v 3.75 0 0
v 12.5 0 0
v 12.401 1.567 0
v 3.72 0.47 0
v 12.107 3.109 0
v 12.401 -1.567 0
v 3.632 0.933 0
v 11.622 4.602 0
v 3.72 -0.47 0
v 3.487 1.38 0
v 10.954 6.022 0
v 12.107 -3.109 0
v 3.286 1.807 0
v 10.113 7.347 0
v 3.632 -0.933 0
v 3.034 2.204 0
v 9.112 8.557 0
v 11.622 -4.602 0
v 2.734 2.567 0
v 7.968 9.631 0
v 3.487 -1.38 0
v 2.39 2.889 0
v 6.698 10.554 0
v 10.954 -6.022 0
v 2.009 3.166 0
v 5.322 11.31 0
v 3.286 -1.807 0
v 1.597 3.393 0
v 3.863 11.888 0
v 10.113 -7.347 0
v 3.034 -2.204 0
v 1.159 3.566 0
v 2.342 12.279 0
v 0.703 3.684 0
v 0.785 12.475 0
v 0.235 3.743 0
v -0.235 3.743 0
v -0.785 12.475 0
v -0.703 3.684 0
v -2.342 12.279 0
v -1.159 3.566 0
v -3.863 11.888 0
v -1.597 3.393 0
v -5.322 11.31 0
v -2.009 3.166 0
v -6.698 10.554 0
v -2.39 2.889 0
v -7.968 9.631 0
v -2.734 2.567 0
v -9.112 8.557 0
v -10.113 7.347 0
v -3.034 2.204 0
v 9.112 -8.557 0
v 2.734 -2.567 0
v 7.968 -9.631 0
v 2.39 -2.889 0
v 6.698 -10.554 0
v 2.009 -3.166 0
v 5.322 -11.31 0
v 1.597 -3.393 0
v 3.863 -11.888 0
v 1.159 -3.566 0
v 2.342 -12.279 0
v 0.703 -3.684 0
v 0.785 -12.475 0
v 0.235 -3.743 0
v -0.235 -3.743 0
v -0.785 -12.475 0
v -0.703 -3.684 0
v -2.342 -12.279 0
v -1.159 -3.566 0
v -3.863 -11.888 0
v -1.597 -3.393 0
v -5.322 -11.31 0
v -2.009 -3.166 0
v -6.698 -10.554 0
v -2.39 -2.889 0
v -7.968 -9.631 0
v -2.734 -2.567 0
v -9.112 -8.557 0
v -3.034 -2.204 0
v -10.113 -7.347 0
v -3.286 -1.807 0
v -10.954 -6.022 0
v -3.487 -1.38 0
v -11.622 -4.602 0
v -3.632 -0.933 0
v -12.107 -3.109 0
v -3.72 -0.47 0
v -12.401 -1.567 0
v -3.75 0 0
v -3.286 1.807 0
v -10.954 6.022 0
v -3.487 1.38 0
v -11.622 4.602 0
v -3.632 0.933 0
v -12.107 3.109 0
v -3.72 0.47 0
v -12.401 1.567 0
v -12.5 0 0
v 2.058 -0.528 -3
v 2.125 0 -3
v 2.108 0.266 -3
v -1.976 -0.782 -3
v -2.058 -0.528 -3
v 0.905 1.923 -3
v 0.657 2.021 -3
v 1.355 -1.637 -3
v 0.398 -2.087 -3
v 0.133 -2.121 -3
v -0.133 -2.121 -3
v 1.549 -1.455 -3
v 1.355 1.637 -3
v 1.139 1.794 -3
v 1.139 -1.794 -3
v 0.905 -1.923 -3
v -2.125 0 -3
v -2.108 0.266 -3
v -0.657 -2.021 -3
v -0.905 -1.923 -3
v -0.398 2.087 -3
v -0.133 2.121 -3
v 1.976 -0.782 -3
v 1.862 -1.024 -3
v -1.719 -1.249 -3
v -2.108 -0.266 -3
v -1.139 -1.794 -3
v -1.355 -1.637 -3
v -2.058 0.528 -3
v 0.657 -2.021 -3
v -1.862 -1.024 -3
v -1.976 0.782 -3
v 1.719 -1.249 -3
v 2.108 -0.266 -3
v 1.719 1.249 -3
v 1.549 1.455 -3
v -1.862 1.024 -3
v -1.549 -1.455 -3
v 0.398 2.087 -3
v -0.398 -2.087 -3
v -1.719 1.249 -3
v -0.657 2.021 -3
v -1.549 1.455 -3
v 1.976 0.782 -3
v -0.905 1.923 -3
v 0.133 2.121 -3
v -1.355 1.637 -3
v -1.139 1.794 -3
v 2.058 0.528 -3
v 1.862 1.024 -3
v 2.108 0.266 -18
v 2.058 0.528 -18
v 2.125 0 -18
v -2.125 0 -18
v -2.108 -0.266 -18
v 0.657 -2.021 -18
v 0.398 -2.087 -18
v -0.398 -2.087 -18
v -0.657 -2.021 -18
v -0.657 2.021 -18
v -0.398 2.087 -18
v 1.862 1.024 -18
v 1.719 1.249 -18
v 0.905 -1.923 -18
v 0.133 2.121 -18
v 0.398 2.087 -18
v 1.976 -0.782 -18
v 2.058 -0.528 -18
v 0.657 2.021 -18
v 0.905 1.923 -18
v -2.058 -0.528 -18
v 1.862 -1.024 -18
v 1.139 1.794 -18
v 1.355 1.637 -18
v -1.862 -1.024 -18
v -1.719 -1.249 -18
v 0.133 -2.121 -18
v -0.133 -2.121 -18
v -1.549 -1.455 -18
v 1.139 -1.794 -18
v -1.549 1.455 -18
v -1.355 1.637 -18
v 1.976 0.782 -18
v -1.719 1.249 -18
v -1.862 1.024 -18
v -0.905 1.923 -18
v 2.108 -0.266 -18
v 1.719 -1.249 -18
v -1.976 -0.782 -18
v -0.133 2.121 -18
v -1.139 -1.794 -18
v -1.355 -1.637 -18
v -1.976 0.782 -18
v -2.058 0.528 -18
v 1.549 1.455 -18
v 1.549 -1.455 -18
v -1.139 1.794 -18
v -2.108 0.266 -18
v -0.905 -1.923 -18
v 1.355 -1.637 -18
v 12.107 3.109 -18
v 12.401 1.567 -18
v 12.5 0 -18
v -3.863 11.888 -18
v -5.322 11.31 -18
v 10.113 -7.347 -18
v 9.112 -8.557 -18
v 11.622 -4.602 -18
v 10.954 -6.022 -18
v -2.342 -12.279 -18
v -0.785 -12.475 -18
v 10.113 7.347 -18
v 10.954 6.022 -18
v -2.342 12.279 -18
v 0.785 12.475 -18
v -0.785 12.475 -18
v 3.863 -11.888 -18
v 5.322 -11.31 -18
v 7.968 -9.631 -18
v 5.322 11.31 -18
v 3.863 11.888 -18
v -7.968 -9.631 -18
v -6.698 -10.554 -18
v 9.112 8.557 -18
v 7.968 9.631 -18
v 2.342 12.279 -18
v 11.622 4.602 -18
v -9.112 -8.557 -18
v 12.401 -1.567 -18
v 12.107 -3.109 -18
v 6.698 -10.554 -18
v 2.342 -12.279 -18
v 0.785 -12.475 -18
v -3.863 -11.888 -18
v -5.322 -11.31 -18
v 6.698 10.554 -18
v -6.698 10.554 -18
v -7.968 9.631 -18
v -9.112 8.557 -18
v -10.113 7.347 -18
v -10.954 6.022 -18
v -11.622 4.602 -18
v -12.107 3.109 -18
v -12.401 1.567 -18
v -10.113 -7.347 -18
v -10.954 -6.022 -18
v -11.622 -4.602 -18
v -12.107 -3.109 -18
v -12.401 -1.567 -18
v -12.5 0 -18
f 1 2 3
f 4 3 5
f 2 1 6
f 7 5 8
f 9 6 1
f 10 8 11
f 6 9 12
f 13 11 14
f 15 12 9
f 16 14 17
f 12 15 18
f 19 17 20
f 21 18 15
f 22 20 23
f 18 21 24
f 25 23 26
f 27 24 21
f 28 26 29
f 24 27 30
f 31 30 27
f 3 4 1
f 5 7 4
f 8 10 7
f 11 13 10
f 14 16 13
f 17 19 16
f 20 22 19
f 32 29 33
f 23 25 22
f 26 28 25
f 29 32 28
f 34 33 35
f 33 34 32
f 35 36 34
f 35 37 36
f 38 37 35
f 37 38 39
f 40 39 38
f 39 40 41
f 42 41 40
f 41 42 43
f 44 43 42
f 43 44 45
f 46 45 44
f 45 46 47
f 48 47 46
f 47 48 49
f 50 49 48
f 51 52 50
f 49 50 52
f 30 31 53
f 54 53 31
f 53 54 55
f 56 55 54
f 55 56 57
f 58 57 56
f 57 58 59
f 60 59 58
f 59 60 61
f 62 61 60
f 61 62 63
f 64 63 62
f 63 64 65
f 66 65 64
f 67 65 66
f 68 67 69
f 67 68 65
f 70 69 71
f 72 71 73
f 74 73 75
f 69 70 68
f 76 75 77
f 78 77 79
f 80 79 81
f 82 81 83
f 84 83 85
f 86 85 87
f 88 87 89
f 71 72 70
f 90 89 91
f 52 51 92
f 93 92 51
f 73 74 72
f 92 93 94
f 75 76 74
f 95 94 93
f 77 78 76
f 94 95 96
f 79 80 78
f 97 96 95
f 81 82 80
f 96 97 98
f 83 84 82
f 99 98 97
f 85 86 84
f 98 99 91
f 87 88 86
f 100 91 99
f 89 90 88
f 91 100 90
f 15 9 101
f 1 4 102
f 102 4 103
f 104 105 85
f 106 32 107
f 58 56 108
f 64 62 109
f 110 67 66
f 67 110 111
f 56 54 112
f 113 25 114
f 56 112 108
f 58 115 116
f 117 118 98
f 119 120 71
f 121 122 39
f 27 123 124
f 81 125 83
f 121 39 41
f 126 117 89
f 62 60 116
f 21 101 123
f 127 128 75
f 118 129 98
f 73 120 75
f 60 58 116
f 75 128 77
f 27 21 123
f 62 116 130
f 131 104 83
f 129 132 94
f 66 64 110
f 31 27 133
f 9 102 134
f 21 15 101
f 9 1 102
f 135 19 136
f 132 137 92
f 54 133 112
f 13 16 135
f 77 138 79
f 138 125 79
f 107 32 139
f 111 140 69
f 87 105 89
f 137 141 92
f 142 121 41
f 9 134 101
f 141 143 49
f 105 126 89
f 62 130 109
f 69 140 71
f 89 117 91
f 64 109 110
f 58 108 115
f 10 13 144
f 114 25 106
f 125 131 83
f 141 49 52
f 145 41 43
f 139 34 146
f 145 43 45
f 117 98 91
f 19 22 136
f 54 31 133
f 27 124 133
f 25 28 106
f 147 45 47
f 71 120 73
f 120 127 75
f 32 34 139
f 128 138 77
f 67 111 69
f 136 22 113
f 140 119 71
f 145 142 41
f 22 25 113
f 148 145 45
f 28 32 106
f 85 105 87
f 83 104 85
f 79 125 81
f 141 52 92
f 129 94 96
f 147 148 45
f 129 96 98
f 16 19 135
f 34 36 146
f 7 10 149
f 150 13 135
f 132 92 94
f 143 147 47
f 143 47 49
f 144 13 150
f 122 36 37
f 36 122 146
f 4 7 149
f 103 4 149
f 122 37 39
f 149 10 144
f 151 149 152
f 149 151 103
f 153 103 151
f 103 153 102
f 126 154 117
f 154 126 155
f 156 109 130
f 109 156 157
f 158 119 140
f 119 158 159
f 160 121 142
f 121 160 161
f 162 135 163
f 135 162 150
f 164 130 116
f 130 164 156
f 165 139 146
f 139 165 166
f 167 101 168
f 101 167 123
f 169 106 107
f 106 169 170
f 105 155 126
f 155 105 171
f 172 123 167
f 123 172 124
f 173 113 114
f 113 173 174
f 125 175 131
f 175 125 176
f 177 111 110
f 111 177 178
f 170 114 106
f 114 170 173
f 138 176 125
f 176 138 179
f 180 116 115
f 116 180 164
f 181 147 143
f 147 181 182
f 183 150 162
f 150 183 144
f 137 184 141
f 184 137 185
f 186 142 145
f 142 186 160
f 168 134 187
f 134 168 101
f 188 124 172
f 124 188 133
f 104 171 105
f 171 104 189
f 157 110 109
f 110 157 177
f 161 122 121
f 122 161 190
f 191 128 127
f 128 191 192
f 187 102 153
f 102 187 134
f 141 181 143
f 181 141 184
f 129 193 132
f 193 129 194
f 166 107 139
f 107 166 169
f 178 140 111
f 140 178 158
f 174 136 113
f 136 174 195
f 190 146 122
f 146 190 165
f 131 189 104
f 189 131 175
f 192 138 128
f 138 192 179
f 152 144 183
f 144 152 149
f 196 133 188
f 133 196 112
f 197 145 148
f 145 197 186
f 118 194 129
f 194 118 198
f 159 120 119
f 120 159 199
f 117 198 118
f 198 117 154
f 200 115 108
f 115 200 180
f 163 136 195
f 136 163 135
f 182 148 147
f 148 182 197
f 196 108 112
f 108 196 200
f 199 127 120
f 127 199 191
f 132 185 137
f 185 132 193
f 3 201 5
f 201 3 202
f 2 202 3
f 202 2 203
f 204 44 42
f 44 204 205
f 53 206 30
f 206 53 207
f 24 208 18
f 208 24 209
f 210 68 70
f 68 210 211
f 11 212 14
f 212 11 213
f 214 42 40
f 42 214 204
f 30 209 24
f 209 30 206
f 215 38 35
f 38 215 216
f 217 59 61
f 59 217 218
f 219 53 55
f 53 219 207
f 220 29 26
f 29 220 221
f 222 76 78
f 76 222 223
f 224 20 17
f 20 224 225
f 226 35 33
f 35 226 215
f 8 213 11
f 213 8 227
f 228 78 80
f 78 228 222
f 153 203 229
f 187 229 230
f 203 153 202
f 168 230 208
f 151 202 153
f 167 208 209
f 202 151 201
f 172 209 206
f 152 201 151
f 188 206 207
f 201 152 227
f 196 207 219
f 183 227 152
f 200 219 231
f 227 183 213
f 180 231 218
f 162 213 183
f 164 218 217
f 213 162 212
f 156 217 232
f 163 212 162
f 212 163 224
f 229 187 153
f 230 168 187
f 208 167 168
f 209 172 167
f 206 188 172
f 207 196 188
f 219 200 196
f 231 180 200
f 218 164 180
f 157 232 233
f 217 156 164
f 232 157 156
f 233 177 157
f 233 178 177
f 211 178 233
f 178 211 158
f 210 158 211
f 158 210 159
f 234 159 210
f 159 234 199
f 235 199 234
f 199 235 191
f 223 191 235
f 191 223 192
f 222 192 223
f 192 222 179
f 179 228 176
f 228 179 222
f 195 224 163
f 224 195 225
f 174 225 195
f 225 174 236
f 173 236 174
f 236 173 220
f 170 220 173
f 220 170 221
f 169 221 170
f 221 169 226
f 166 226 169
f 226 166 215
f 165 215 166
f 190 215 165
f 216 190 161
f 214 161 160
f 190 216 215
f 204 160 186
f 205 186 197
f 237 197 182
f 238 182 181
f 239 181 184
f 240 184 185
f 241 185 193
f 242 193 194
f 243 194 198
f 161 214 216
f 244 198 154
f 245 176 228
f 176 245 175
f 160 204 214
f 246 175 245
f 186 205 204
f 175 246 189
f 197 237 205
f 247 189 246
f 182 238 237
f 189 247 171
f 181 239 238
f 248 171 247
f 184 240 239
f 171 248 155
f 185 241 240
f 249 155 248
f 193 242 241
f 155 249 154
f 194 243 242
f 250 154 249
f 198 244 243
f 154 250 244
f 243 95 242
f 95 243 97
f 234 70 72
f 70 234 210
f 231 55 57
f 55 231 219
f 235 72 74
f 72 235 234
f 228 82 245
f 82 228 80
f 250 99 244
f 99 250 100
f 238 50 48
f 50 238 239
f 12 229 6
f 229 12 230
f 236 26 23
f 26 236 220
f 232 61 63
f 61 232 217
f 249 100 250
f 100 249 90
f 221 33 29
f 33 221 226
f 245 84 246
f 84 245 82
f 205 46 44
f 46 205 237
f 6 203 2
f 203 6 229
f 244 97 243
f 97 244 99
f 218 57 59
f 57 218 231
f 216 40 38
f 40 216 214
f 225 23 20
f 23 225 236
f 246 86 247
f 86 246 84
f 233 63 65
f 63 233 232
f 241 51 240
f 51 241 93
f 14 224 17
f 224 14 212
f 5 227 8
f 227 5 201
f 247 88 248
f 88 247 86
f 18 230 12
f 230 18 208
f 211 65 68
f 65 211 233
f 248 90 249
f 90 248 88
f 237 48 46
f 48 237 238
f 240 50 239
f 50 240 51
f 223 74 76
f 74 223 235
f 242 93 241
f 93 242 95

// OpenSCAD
$fn = 50;

difference() {
	union() {
		translate(v = [0, 0, -18.0]) {
			cylinder(h = 18, r = 12.5);
		}
	}
	union() {
		translate(v = [0, 0, 0]) {
			rotate(a = [0, 0, 0]) {
				difference() {
					union() {
						translate(v = [0, 0, -21.0]) {
							cylinder(h = 21, r = 2.0);
						}
						translate(v = [0, 0, -3]) {
							cylinder(h = 3, r1 = 2.125, r2 = 3.75);
						}
						translate(v = [0, 0, -21.0]) {
							cylinder(h = 21, r = 2.125);
						}
						translate(v = [0, 0, -21.0]) {
							cylinder(h = 21, r = 2.0);
						}
					}
					union();
				}
			}
		}
	}
}
